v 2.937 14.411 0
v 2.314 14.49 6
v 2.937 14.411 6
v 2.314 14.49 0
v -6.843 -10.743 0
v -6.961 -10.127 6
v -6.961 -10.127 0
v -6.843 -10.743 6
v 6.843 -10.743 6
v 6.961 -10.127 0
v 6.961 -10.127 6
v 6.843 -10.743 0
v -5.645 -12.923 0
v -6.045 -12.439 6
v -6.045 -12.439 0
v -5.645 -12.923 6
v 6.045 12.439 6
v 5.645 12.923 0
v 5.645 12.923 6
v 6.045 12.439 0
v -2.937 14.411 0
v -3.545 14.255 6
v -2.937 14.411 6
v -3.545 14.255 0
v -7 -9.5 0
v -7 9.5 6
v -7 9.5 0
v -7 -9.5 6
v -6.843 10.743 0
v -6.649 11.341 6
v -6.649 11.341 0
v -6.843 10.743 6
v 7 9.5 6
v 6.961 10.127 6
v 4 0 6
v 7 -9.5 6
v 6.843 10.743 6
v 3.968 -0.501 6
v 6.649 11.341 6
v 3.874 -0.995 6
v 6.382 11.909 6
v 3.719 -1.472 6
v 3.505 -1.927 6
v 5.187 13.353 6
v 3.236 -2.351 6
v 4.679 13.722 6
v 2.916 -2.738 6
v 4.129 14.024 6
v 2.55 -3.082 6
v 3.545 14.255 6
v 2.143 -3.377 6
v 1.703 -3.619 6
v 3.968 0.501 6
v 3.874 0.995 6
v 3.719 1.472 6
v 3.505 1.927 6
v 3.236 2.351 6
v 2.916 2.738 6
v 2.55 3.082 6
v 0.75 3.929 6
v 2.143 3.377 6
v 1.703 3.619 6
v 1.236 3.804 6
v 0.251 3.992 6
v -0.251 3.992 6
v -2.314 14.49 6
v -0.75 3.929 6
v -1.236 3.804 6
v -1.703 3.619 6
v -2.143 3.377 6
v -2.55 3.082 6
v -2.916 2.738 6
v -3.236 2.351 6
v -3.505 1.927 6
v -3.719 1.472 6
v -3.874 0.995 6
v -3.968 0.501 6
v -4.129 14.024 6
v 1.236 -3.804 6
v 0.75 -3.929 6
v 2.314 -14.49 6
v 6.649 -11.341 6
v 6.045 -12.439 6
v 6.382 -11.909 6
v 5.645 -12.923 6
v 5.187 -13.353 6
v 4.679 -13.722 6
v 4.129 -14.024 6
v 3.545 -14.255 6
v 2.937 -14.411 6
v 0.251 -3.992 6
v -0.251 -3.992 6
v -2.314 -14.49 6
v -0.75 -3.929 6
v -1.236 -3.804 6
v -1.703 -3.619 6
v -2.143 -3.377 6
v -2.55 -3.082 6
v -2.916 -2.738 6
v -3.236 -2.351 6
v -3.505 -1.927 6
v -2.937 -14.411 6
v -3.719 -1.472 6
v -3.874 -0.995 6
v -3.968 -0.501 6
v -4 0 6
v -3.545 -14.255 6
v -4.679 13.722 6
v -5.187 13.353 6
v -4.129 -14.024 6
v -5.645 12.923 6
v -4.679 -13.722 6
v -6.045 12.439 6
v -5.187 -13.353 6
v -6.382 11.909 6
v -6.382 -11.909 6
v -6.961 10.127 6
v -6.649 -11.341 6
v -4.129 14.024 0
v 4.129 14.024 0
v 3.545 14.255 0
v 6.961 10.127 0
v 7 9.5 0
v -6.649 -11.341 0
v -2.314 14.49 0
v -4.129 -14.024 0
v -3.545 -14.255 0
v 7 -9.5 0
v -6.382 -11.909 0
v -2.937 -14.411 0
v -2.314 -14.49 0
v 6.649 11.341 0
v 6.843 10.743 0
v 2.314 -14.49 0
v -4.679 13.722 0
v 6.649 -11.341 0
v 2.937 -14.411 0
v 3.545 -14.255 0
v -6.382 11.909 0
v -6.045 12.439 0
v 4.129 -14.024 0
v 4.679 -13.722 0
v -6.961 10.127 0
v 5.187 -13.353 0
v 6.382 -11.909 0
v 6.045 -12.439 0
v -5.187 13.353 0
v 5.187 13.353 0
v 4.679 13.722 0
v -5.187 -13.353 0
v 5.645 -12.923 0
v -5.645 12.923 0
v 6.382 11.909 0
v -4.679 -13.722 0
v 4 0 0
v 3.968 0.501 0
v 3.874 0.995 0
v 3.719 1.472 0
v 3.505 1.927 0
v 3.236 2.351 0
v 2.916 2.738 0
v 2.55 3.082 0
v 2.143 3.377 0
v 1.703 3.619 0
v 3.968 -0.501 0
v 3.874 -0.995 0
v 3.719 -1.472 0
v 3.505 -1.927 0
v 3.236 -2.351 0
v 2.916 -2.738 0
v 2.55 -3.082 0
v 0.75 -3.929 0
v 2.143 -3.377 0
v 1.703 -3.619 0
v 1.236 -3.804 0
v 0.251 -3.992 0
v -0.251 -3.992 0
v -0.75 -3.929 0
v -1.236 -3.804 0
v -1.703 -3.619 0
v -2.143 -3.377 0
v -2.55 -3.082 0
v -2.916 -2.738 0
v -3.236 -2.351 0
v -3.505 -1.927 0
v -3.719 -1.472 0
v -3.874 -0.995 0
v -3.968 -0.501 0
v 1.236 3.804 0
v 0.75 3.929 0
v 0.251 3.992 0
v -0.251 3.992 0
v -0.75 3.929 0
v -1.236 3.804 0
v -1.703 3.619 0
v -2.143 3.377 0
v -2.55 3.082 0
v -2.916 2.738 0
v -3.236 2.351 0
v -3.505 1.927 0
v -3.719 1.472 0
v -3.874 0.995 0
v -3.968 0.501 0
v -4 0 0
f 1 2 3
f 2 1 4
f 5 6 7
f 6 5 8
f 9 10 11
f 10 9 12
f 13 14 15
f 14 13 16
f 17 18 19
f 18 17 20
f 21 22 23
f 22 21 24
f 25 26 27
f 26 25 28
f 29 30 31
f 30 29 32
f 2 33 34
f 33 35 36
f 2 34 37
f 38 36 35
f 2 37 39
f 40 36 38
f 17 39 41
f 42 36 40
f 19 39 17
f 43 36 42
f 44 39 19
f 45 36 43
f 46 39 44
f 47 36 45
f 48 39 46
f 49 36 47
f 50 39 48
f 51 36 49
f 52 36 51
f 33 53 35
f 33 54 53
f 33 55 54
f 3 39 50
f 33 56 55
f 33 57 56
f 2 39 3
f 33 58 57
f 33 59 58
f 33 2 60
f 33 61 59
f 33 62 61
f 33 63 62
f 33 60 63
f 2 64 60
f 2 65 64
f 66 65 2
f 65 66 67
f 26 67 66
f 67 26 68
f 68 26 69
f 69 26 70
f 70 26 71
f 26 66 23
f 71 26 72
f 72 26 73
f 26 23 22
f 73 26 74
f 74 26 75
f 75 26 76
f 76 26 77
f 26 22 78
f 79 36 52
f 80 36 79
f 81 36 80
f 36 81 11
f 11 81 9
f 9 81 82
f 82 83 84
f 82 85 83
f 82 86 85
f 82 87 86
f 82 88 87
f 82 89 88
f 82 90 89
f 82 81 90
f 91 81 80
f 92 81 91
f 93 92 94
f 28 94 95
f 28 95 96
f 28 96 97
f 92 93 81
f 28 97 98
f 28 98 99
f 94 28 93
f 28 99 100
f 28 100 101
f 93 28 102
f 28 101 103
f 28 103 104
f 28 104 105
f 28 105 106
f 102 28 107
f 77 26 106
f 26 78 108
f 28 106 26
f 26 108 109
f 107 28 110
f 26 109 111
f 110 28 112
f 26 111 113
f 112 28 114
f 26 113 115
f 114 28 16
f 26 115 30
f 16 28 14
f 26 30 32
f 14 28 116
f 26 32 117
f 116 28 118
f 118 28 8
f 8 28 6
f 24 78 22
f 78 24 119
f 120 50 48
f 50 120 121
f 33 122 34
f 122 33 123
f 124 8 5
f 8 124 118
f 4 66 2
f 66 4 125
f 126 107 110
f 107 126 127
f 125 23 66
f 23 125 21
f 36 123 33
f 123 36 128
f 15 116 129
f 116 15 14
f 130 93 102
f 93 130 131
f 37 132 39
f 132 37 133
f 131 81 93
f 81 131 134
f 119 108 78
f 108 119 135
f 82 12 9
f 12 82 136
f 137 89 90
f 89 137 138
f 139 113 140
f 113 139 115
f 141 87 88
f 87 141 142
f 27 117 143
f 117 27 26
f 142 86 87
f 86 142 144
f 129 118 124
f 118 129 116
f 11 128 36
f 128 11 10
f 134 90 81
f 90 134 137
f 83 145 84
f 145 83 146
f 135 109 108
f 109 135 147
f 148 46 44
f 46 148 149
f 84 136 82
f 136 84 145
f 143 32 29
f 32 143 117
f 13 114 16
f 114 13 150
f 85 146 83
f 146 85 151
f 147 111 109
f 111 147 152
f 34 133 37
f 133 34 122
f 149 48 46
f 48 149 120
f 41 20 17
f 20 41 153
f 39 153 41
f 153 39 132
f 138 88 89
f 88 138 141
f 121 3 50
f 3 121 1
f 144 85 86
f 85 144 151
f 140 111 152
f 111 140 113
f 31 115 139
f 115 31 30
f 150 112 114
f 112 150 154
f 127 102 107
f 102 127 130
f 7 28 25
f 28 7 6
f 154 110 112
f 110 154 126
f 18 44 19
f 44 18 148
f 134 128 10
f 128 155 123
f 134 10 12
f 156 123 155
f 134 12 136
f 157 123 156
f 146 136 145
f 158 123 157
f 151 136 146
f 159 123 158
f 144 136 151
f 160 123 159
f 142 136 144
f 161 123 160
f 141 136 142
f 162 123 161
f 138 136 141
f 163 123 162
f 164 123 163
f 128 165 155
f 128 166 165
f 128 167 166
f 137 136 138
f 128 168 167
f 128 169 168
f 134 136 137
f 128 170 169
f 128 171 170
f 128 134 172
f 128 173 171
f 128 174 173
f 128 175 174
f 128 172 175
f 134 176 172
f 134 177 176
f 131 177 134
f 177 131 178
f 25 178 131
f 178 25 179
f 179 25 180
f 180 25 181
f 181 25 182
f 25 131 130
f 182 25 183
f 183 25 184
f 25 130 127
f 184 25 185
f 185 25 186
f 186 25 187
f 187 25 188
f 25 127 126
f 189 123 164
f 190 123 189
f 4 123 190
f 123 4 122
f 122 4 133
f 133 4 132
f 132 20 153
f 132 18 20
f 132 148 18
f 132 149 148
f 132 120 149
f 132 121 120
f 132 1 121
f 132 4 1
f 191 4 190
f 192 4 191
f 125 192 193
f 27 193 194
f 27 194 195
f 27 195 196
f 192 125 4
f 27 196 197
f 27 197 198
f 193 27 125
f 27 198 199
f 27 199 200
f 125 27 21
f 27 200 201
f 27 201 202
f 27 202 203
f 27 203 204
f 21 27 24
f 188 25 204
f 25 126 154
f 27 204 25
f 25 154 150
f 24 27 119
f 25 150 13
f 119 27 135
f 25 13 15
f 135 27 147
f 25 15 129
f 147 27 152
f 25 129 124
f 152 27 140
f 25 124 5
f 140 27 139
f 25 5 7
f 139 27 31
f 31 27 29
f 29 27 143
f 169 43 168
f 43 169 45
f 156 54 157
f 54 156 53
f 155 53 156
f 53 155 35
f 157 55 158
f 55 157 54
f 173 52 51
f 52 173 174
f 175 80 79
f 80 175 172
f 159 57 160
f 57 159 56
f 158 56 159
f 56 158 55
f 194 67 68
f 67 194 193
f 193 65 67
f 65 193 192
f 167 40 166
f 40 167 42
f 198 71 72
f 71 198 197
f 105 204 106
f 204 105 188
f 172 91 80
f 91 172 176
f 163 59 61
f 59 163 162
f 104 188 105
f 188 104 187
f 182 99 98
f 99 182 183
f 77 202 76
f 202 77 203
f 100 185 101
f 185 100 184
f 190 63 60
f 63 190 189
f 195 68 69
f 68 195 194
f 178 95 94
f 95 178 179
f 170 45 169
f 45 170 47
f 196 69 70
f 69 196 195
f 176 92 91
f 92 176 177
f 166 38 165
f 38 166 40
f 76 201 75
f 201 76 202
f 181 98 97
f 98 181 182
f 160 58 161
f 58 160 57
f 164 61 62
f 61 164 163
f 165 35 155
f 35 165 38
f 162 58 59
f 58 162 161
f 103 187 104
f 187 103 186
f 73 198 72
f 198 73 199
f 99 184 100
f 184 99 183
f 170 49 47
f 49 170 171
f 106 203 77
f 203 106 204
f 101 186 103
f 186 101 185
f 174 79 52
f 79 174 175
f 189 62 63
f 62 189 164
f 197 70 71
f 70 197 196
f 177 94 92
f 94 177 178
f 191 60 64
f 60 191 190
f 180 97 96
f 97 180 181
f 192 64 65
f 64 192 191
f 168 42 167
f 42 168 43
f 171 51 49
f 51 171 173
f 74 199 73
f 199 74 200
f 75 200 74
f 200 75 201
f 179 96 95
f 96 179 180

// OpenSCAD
$fn = 50;

difference() {
	union() {
		hull() {
			translate(v = [-2.0, 9.5, 0]) {
				cylinder(h = 6, r = 5);
			}
			translate(v = [2.0, 9.5, 0]) {
				cylinder(h = 6, r = 5);
			}
			translate(v = [-2.0, -9.5, 0]) {
				cylinder(h = 6, r = 5);
			}
			translate(v = [2.0, -9.5, 0]) {
				cylinder(h = 6, r = 5);
			}
		}
	}
	union() {
		cylinder(h = 6, r = 4.0);
	}
}
